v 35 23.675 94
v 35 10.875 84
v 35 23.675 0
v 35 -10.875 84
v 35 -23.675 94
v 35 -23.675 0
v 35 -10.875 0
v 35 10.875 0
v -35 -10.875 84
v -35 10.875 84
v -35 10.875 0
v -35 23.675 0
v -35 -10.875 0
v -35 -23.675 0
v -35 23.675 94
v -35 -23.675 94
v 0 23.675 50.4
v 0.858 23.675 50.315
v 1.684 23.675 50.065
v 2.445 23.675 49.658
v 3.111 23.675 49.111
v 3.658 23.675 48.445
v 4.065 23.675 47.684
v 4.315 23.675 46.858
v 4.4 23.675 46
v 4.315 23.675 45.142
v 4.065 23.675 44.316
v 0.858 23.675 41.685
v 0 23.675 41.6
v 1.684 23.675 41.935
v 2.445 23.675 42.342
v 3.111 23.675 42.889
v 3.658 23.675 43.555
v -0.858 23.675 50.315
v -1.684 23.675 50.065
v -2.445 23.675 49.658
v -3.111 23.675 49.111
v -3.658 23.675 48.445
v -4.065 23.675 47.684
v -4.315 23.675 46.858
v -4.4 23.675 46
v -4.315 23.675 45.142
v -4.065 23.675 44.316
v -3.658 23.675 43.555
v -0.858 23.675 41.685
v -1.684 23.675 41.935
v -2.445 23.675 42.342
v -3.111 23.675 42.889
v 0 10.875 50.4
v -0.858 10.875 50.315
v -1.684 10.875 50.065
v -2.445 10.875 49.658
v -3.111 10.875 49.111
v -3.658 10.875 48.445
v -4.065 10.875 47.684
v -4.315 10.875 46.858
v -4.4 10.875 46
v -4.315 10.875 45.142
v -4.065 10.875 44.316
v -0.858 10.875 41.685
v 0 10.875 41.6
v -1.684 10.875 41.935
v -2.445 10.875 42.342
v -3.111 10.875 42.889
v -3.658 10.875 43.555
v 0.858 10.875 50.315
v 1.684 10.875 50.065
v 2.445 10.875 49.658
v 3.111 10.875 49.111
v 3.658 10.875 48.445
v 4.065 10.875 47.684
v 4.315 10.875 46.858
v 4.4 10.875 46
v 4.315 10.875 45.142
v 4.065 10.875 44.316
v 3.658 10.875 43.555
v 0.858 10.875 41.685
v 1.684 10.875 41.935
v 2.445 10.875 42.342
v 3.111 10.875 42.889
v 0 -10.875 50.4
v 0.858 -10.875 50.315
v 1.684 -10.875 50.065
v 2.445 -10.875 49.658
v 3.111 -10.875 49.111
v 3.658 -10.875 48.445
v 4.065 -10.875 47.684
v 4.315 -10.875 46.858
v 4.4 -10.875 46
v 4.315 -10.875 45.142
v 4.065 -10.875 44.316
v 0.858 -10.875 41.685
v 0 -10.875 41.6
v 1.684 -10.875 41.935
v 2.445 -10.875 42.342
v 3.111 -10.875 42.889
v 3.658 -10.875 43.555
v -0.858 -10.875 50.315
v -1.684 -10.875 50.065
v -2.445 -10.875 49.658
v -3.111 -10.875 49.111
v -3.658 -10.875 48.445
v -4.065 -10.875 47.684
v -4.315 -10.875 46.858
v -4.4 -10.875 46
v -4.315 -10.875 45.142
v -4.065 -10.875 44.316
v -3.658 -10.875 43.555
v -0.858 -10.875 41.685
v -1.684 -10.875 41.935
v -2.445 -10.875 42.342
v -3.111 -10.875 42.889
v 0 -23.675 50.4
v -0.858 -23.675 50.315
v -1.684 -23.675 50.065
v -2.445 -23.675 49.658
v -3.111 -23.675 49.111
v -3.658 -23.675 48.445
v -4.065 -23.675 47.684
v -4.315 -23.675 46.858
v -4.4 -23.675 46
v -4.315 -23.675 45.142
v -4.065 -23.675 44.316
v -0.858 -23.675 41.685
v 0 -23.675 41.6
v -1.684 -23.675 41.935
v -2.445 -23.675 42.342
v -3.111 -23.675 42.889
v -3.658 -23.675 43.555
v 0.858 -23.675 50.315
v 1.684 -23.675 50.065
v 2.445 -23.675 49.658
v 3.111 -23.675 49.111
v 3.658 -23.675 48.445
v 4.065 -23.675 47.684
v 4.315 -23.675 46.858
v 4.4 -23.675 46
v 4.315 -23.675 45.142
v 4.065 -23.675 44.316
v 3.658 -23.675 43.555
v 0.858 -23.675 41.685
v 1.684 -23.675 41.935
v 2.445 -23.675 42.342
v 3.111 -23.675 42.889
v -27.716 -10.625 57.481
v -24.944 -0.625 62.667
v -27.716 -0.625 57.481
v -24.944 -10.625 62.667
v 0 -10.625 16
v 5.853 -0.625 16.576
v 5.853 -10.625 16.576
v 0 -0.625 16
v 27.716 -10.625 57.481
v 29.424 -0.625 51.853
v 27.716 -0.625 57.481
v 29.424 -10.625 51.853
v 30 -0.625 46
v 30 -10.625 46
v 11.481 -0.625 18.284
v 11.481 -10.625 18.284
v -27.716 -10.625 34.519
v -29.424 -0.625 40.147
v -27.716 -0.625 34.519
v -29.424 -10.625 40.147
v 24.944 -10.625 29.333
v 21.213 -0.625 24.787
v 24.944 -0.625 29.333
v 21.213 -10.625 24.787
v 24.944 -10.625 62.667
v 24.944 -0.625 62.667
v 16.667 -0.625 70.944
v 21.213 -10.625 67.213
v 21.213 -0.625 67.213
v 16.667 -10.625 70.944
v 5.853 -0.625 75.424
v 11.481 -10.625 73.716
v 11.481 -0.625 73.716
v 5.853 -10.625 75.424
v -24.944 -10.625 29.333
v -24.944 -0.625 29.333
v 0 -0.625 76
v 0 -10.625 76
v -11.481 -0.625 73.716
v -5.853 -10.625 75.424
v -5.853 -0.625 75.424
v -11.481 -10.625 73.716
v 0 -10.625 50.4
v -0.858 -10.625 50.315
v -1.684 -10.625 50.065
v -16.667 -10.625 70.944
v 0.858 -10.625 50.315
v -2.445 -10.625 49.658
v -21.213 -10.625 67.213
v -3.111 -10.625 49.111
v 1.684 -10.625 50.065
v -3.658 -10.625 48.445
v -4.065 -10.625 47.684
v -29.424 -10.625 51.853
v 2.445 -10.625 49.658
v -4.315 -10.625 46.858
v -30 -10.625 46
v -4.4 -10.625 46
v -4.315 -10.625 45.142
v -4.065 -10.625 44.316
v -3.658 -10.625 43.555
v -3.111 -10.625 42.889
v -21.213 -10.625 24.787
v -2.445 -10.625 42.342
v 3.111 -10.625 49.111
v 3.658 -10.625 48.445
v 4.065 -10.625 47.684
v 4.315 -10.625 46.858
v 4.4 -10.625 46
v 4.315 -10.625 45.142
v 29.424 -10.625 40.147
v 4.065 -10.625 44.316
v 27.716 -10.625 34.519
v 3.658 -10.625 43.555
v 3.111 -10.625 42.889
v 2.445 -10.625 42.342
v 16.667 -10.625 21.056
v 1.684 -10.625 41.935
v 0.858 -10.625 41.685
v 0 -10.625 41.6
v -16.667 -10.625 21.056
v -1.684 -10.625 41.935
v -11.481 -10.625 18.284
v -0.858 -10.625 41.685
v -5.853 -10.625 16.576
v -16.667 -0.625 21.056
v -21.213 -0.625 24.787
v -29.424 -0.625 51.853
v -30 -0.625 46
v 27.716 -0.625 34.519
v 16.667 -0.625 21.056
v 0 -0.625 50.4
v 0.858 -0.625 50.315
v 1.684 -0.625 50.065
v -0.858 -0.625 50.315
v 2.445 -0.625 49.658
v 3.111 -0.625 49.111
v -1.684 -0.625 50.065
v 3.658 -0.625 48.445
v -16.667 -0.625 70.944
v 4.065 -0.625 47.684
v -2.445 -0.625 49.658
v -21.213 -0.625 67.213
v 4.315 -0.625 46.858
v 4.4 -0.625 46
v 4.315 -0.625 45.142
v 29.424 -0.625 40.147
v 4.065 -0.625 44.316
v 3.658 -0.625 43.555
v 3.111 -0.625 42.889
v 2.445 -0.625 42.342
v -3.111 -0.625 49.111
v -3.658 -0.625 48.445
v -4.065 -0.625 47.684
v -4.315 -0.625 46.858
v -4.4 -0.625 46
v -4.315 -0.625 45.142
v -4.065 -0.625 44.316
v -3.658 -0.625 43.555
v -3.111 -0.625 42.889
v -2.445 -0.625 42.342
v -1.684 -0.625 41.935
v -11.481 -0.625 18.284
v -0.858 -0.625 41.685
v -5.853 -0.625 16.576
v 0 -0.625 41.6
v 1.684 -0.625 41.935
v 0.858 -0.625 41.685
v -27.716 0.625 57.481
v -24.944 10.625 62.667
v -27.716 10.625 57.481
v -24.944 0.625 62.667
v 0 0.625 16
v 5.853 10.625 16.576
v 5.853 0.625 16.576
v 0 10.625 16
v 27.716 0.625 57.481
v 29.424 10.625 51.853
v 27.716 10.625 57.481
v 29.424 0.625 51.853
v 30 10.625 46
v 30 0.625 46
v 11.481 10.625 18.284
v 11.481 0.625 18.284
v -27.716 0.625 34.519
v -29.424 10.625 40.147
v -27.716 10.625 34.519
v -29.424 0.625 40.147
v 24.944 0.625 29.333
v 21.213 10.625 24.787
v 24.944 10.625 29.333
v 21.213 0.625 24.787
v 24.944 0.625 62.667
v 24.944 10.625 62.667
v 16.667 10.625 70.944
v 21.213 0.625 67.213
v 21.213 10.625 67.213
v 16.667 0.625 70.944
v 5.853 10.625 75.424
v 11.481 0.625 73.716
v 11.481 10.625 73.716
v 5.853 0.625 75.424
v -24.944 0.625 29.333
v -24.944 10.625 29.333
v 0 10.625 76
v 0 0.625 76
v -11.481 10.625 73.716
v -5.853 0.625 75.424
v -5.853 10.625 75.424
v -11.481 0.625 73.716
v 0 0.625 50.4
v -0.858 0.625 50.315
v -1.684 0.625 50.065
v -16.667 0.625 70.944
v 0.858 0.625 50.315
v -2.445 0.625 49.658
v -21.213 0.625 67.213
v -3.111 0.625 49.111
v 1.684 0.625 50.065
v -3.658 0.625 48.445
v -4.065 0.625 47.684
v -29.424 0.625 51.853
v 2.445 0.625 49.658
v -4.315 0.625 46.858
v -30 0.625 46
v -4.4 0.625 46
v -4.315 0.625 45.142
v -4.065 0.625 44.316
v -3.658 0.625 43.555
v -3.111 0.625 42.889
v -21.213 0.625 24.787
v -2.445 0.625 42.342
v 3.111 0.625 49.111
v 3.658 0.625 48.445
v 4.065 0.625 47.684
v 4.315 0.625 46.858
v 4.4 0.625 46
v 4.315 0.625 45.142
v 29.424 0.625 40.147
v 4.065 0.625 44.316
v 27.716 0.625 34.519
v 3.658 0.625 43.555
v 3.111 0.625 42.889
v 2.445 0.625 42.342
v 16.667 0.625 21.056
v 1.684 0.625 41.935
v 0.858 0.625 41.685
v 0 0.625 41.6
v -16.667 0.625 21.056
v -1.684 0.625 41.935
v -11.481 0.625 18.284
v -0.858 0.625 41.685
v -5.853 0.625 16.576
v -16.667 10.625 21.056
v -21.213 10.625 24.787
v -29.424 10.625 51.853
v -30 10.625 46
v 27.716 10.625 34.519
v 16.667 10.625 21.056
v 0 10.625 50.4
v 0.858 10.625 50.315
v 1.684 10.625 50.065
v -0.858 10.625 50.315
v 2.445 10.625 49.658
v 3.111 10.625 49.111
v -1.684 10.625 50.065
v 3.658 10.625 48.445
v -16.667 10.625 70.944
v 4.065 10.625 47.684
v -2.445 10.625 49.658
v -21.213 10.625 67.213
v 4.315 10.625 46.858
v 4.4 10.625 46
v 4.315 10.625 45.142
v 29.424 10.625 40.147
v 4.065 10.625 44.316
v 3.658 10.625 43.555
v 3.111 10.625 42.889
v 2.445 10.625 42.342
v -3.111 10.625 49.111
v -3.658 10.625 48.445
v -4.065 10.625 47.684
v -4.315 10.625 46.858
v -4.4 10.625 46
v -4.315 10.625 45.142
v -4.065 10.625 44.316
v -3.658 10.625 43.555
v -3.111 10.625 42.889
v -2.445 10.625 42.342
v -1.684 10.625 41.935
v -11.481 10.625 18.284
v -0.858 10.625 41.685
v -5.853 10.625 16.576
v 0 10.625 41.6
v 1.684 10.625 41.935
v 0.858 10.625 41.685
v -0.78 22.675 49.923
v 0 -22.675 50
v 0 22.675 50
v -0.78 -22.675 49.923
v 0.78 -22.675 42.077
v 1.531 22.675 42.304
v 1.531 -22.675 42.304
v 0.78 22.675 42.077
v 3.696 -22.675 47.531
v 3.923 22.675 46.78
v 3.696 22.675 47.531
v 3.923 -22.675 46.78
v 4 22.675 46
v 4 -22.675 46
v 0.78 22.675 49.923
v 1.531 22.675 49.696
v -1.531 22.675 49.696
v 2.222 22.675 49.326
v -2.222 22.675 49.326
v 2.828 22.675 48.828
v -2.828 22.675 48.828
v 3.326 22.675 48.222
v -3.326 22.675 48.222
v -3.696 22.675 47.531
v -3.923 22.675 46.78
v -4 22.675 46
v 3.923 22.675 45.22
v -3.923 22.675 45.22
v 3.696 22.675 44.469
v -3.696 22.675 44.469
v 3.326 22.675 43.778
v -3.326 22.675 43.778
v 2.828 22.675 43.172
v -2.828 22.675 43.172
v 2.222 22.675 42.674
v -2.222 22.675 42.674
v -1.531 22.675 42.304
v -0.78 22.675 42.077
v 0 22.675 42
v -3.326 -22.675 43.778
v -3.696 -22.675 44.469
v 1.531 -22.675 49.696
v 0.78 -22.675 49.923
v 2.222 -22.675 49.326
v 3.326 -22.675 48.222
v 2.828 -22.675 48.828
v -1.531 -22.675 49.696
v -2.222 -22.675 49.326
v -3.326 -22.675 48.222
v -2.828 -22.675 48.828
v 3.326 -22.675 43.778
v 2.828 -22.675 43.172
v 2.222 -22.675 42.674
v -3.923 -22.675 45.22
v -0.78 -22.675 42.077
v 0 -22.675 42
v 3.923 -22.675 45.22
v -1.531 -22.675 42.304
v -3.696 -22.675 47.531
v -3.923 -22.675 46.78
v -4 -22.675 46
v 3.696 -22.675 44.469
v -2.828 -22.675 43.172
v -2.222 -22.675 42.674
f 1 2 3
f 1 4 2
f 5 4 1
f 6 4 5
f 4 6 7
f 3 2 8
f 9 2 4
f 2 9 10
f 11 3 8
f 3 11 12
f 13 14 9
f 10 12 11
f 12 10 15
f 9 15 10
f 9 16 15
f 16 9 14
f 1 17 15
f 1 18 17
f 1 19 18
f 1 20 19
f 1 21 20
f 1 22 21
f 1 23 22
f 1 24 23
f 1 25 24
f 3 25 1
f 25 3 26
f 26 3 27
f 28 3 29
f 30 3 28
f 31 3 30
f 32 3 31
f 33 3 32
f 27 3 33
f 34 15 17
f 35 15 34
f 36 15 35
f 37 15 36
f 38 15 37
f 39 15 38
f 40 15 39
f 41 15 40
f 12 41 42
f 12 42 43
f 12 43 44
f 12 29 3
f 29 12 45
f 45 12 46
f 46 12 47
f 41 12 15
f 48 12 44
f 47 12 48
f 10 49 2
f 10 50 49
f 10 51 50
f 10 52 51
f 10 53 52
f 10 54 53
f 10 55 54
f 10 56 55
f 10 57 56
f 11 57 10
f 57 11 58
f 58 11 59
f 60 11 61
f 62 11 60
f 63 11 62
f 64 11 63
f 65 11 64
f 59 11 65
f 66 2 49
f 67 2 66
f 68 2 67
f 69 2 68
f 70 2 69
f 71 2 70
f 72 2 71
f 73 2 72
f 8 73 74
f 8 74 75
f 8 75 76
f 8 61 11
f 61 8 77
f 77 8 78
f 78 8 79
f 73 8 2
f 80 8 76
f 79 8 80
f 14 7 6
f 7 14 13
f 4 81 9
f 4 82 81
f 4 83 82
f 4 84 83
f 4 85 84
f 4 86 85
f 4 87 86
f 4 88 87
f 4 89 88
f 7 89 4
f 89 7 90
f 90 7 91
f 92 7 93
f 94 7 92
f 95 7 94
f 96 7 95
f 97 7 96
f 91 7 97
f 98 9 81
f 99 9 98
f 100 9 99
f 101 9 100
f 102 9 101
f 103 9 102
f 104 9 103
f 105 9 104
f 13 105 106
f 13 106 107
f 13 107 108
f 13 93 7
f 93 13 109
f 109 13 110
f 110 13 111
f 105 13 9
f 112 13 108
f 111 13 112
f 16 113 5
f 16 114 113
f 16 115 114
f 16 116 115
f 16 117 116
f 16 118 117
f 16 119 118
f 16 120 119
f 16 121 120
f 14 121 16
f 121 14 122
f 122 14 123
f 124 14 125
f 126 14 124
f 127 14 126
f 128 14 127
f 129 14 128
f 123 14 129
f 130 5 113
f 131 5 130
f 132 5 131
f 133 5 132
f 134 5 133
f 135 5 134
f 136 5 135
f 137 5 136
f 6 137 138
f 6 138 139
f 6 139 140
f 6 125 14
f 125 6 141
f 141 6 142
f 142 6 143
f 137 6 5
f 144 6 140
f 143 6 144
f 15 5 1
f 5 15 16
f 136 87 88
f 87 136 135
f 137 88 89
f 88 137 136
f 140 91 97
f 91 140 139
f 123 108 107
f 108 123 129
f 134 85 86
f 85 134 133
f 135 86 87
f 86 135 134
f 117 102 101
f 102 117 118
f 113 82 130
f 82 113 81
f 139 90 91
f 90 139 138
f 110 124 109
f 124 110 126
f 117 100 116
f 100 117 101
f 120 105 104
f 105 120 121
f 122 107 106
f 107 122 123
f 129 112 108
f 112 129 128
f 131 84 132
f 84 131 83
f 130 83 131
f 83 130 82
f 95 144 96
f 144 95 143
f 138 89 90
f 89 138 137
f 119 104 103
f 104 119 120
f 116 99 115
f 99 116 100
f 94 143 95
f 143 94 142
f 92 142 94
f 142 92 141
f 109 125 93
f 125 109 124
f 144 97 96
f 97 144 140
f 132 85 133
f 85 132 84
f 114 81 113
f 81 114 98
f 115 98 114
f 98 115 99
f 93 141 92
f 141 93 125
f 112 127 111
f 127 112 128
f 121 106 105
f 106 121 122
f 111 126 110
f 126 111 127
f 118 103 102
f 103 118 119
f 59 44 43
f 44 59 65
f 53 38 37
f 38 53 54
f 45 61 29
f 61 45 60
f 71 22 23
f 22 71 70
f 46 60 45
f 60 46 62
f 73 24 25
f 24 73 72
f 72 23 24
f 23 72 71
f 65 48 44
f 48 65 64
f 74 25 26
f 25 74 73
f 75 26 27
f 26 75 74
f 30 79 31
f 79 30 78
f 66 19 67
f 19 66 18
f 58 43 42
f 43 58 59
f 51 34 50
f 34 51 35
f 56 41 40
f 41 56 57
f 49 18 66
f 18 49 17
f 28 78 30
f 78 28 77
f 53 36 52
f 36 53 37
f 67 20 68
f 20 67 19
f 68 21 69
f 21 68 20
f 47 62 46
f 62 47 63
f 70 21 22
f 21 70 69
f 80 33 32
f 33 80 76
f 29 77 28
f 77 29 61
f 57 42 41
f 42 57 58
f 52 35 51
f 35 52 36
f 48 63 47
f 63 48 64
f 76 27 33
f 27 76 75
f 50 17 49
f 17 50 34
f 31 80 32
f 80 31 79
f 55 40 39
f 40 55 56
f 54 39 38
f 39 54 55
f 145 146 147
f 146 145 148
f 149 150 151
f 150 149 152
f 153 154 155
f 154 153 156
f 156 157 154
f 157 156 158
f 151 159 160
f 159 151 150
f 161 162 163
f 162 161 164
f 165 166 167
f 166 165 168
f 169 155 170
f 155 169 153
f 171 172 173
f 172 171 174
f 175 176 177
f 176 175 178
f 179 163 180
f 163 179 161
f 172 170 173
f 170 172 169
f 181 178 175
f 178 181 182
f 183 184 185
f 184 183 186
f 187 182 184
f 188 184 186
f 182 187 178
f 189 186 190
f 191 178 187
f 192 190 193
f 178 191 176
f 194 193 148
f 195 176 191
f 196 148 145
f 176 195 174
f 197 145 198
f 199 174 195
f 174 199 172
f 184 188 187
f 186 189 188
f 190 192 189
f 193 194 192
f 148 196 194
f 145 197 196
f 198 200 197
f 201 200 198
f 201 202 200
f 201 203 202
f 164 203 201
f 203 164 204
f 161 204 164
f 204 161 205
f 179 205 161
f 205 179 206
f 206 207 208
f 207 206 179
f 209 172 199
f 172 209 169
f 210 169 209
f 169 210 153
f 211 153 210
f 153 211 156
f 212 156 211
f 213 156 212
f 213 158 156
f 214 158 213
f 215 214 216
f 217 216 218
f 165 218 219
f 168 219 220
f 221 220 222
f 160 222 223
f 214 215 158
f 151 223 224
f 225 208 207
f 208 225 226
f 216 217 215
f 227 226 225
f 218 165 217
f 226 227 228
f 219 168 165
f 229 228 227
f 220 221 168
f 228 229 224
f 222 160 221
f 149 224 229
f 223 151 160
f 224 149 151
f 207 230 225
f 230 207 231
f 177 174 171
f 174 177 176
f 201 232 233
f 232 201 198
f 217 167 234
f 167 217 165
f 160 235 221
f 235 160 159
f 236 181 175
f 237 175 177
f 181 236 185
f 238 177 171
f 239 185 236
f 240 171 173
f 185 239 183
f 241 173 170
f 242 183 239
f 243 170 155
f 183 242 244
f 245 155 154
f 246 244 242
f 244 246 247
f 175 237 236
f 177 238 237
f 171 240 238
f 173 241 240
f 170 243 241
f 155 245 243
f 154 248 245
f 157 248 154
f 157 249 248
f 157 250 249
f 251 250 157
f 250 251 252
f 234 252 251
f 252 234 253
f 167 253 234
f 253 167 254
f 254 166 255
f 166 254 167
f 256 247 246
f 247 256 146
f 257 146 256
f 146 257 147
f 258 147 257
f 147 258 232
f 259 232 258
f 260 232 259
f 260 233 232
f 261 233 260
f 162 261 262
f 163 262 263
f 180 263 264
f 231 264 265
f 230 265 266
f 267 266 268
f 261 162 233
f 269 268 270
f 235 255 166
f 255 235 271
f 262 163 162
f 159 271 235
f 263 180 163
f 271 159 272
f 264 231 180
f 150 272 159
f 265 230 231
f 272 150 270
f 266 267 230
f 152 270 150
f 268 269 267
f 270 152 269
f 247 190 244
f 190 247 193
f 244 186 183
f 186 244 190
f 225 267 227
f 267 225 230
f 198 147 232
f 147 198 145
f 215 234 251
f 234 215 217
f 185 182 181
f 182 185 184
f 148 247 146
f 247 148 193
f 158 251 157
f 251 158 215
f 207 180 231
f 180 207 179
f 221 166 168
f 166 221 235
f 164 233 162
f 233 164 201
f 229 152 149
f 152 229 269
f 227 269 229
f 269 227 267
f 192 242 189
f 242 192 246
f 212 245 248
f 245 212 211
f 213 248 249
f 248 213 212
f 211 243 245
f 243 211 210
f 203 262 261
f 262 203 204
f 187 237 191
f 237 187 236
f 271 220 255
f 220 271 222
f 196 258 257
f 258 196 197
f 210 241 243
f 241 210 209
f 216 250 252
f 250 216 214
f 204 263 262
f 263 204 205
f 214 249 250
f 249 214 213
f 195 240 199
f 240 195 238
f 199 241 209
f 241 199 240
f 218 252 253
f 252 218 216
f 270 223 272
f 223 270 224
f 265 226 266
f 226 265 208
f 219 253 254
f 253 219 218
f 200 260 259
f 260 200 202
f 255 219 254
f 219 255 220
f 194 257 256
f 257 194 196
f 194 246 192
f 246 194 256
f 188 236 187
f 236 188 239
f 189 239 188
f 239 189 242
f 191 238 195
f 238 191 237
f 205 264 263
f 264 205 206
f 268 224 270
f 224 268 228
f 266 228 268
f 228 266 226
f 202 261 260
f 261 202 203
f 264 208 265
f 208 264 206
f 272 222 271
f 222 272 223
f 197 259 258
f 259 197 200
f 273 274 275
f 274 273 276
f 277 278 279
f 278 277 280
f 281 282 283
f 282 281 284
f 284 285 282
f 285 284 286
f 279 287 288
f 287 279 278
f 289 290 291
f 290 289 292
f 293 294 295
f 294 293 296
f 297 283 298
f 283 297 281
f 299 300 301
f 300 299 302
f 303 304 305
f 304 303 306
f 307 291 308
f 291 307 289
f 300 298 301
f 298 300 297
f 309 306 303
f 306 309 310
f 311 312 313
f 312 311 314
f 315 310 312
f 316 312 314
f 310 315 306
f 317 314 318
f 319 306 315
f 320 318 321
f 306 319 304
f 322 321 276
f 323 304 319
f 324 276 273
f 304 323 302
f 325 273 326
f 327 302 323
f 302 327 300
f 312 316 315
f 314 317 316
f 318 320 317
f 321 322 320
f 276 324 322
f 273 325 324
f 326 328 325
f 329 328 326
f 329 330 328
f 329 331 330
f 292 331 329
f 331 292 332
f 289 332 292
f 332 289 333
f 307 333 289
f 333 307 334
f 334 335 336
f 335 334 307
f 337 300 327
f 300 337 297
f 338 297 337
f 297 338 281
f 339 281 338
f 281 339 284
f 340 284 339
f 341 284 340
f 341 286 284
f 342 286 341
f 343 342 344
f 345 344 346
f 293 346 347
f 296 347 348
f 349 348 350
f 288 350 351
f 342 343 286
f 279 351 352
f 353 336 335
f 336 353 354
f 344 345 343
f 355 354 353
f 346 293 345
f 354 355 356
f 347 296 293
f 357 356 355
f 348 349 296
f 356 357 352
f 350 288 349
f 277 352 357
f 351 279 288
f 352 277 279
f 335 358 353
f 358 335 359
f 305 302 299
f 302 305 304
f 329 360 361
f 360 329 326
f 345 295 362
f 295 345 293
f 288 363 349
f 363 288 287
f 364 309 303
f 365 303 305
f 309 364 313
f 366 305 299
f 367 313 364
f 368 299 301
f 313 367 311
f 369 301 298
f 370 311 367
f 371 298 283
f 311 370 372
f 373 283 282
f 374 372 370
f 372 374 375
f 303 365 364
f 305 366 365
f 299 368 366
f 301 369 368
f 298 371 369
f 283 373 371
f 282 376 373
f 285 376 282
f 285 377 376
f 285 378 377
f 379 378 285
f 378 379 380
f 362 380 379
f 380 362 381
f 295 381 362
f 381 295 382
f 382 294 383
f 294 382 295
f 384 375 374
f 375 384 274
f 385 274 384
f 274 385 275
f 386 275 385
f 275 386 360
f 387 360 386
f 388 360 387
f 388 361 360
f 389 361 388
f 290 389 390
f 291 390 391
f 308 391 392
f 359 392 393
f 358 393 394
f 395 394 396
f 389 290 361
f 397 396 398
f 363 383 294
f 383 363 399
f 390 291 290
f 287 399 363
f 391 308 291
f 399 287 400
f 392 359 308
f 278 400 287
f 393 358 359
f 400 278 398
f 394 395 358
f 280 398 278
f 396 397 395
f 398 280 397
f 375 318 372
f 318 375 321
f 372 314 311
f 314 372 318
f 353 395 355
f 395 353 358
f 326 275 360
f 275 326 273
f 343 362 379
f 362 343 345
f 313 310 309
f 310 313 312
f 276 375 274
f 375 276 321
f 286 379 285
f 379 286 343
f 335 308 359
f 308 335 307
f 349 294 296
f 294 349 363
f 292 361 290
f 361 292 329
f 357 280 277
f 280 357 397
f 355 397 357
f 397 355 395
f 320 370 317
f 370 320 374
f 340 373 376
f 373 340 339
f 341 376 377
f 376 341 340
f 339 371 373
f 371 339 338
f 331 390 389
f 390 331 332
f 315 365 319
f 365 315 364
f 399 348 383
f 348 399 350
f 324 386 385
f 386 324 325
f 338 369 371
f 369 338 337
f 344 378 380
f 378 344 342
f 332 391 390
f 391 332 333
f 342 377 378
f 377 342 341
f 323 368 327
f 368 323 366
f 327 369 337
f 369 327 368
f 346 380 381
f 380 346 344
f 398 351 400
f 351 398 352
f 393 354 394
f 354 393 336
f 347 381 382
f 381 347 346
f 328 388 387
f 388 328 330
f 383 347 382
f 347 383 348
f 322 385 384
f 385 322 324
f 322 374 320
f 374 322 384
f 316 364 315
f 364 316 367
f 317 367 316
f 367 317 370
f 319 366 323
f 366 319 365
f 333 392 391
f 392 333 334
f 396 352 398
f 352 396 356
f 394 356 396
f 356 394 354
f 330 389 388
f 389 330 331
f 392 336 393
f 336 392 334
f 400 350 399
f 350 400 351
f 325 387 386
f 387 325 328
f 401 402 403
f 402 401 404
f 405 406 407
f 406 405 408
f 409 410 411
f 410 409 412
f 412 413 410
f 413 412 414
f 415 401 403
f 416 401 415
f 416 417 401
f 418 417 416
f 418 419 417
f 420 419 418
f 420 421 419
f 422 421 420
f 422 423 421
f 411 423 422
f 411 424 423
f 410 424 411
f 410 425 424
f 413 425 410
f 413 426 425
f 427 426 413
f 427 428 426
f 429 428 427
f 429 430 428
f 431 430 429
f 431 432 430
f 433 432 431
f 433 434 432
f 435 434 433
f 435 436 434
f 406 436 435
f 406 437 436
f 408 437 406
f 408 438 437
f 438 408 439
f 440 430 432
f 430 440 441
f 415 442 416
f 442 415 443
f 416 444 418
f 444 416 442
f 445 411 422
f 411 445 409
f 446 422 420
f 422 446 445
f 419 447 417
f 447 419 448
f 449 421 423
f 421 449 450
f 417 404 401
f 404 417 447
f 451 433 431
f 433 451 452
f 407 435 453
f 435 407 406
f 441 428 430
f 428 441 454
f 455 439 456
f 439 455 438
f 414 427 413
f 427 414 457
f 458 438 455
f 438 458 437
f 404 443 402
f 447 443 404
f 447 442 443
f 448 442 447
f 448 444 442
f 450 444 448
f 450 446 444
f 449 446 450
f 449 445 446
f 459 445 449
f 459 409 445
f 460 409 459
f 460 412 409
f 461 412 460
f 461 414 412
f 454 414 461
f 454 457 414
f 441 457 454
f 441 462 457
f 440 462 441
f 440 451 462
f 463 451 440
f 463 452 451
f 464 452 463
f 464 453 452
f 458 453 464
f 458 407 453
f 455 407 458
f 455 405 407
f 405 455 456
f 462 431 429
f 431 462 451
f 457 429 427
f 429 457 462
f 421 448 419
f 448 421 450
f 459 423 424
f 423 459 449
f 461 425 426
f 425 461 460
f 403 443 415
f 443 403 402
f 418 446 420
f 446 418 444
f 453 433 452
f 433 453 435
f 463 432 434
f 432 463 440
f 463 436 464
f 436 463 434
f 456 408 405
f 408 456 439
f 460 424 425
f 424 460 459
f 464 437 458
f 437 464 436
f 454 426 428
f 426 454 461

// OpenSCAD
$fn = 32;

// ------------------------------------------------------------------------
// Trolley wheel set: wheels d60, fork 84 mm tall
// Every part is its own module, assembly() places every instance.
// ------------------------------------------------------------------------

// --- part 1 ---
module trolley_fork() {
  difference() {
    union() {
      translate([-35, 10.875, 0]) cube([70, 12.8, 84]);
      translate([-35, -23.675, 0]) cube([70, 12.8, 84]);
      translate([-35, -23.675, 84]) cube([70, 47.35, 10]);
    }
    translate([0, -17.275, 46]) rotate([90, 0, 0]) cylinder(h = 14.8, d = 8.8, center = true);
    translate([0, 17.275, 46]) rotate([90, 0, 0]) cylinder(h = 14.8, d = 8.8, center = true);
  }
}

// --- part 2 ---
module trolley_wheel() {
  difference() {
      translate([0, 0, 0]) cylinder(h = 10, d = 60);
      translate([0, 0, -1]) cylinder(h = 12, d = 8.8);
    }
}

// --- part 3 ---
module trolley_axle() {
  translate([0, 0, -22.675]) cylinder(h = 45.35, d = 8);
}

// --- assembly ---
module assembly() {
  color([0.80, 0.24, 0.20]) translate([0, 0, 0]) rotate([0, 0, 0]) trolley_fork();
  color([0.20, 0.45, 0.75]) translate([0, -0.625, 46]) rotate([90, 0, 0]) trolley_wheel();
  color([0.25, 0.62, 0.32]) translate([0, 10.625, 46]) rotate([90, 0, 0]) trolley_wheel();
  color([0.92, 0.70, 0.18]) translate([0, 0, 46]) rotate([90, 0, 0]) trolley_axle();
}

assembly();
